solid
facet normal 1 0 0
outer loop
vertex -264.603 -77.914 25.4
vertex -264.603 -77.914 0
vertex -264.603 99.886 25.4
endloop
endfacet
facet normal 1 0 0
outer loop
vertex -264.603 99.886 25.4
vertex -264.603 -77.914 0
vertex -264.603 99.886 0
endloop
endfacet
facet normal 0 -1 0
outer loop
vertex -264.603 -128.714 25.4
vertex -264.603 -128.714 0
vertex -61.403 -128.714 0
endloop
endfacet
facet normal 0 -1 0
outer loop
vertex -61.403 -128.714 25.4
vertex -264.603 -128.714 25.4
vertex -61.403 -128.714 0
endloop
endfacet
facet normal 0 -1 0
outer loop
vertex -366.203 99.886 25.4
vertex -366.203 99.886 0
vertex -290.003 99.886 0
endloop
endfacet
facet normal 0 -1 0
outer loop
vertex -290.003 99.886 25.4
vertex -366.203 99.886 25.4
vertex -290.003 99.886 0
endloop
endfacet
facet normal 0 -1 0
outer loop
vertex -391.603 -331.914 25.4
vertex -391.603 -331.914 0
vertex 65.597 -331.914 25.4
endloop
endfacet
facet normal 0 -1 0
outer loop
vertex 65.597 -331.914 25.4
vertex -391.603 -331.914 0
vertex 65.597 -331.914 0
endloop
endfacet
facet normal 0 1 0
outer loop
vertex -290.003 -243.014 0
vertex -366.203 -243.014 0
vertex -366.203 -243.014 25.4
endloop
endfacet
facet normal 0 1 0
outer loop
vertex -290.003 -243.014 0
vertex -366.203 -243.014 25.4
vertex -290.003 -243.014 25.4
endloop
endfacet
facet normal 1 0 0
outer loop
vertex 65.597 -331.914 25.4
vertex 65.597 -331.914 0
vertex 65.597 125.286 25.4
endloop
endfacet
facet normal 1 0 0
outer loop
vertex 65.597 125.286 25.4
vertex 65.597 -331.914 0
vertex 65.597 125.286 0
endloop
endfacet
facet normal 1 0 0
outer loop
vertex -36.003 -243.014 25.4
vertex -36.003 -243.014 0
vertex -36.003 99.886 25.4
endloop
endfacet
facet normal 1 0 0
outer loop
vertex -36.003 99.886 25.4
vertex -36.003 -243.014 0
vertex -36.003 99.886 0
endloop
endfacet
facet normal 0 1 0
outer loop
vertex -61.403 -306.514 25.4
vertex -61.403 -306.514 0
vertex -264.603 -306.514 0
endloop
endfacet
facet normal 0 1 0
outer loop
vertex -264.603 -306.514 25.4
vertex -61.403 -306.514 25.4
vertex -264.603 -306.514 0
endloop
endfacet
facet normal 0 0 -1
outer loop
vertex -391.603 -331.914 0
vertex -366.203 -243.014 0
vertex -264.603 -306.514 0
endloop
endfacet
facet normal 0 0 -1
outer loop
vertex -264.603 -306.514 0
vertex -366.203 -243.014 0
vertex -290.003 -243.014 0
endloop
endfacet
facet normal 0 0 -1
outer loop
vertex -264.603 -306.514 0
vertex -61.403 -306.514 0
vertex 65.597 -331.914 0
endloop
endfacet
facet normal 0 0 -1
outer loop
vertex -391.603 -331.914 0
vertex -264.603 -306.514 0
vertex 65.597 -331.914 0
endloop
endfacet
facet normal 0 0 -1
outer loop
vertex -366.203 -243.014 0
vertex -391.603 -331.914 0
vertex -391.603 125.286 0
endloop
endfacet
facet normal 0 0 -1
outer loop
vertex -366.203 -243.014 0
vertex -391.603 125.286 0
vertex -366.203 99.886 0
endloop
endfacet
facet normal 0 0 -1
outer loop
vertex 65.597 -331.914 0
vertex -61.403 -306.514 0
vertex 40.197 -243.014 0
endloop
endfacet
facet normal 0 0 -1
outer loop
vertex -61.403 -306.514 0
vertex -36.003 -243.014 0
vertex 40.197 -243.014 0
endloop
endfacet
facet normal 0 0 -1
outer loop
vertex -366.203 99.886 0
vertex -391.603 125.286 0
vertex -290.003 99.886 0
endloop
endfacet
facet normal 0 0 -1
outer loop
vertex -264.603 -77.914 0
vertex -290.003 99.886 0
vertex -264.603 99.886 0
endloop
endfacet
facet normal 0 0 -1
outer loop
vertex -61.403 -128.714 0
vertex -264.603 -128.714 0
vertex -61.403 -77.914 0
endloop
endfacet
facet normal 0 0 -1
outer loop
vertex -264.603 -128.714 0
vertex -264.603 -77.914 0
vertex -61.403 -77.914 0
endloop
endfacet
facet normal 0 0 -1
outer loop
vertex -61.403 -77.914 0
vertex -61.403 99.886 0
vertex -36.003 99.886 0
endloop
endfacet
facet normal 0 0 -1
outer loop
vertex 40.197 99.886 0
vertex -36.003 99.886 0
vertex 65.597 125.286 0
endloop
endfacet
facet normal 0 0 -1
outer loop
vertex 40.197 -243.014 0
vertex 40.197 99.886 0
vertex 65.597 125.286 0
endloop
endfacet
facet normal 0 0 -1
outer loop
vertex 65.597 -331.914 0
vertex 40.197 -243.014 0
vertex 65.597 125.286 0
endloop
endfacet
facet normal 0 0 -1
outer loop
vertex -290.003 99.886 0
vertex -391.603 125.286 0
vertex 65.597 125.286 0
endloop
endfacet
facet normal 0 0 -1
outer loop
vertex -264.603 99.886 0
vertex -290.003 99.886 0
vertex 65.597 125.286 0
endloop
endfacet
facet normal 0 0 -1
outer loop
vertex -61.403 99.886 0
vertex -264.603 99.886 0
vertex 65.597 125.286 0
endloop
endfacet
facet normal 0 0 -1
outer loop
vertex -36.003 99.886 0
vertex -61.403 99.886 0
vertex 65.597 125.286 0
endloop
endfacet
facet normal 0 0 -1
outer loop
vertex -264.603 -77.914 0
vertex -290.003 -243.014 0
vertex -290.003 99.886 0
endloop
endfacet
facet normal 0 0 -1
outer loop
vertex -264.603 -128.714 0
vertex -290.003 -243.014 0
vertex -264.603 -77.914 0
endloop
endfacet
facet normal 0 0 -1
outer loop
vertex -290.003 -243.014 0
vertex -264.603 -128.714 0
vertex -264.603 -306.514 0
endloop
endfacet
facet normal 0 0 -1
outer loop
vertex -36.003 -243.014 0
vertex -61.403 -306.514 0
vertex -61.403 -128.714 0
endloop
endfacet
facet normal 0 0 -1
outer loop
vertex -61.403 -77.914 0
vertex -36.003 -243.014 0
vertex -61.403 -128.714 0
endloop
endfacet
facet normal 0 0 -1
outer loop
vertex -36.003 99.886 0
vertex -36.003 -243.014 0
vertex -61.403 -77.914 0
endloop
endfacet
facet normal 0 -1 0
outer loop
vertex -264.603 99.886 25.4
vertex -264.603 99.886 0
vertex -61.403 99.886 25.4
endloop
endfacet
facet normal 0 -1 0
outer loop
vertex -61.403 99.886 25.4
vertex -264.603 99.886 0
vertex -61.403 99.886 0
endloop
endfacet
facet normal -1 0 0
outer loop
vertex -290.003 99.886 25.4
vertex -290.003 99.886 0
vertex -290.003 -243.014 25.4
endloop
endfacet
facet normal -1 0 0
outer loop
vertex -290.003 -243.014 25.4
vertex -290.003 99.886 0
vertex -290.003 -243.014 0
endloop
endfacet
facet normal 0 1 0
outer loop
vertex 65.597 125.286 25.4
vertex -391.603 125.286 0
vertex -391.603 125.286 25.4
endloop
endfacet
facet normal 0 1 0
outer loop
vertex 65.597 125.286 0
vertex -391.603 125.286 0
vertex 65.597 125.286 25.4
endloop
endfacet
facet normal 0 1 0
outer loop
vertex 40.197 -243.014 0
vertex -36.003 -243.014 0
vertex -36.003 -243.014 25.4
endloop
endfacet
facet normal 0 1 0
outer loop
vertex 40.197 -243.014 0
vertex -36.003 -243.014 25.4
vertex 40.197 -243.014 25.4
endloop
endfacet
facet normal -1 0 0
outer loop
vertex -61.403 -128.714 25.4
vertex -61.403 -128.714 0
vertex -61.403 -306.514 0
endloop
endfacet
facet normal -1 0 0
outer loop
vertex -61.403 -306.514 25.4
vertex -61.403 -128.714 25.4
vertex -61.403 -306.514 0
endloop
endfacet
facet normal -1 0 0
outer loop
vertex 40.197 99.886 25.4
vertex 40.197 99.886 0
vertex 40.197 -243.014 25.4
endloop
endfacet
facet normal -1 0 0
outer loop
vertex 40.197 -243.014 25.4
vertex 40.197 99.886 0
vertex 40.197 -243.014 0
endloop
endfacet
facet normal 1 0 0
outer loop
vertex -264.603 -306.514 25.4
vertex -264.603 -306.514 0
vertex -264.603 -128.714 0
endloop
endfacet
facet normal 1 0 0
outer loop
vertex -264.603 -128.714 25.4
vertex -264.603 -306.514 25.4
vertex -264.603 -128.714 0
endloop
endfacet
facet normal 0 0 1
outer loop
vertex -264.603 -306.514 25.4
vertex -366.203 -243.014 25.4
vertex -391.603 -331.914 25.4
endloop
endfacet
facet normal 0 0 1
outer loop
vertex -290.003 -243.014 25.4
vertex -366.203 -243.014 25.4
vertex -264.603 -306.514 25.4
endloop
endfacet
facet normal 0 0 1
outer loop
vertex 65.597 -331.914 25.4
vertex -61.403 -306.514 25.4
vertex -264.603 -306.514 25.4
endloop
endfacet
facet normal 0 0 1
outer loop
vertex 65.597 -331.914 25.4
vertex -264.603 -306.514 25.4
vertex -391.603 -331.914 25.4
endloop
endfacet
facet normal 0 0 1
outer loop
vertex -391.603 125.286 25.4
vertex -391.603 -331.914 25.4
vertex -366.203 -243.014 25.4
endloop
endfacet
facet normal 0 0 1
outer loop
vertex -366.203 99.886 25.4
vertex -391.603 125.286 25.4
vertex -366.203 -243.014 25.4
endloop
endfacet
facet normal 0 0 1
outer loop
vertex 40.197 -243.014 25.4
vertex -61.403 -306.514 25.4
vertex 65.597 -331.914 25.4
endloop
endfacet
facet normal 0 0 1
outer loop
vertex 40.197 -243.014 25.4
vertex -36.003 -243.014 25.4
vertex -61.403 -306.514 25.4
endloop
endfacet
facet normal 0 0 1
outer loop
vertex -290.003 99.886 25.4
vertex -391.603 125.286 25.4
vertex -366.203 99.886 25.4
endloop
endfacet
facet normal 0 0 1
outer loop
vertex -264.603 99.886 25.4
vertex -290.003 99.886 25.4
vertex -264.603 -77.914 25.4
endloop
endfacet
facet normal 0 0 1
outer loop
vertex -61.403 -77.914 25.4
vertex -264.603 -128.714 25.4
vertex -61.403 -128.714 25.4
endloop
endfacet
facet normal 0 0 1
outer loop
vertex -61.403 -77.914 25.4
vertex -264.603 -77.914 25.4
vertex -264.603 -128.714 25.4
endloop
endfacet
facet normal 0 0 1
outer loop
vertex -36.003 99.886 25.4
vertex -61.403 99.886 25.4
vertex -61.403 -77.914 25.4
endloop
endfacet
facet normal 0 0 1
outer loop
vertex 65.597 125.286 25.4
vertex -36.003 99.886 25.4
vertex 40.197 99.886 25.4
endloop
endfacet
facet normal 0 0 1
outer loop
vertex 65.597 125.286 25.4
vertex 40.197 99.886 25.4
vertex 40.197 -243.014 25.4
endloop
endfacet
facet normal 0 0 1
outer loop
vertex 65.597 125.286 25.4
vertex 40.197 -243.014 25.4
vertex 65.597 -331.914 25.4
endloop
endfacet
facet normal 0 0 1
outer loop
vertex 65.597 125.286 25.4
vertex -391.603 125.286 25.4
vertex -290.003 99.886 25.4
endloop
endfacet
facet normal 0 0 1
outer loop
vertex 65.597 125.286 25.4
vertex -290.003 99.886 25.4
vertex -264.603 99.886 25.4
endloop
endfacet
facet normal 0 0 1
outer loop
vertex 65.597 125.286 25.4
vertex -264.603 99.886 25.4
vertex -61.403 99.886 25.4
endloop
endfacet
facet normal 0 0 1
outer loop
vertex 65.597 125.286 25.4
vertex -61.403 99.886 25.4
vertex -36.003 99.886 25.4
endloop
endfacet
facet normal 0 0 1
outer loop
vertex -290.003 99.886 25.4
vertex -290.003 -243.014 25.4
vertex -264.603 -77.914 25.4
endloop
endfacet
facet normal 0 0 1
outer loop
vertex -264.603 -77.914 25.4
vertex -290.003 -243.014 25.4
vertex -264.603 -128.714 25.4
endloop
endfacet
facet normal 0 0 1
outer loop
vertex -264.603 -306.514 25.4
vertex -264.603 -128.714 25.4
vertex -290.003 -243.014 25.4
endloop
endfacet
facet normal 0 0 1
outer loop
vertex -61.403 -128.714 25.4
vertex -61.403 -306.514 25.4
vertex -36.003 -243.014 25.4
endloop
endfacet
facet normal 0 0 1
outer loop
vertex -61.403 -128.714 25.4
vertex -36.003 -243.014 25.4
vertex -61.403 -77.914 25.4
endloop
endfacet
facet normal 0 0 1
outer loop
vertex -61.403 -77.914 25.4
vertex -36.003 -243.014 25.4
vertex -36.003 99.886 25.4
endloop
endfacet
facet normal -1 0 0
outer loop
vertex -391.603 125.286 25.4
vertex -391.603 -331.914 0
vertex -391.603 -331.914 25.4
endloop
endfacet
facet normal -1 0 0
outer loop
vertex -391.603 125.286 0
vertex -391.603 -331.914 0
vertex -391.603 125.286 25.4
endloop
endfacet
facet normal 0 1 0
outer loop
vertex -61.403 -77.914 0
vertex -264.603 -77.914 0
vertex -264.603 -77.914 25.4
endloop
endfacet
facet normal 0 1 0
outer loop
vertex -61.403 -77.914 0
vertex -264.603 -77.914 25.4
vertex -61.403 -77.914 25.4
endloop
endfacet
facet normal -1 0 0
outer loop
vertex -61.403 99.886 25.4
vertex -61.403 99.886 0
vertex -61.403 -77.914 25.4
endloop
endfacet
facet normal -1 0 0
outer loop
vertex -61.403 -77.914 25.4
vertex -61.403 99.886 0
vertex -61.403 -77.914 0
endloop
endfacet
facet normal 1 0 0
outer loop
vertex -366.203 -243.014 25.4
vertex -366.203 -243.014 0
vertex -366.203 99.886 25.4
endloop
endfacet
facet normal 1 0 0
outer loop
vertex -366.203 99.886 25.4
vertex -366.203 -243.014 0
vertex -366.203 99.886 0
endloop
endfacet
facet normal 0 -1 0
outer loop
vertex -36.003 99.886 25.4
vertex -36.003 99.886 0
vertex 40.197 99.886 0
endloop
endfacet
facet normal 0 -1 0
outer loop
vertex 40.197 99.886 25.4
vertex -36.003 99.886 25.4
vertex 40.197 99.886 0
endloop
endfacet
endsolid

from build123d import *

# Parameters (mm, degrees)
F0_W     = 457.2
F0_H     = 457.2
F1_DEPTH = 25.4
F0_W_2   = 203.2
F0_H_2   = 25.4
F2_DEPTH = 25.4
F0_W_3   = 76.2
F0_H_3   = 63.5
F3_DEPTH = 25.4


with BuildPart() as f1:
    # F0 (on Top) → F1 (new body)
    with BuildSketch(Plane.XY):
        with Locations((-163.00304, -103.314487)):
            Rectangle(F0_W, F0_H)
        Polygon((-290.00304, 99.885513), (-264.60304, 99.885513), (-61.40304, 99.885513), (-36.00304, 99.885513), (40.19696, 99.885513), (40.19696, -103.314487), (40.19696, -243.014487), (40.19696, -306.514487), (-36.00304, -306.514487), (-61.40304, -306.514487), (-264.60304, -306.514487), (-290.00304, -306.514487), (-366.20304, -306.514487), (-366.20304, -243.014487), (-366.20304, -103.314487), (-366.20304, 99.885513), align=None, mode=Mode.SUBTRACT)
    extrude(amount=F1_DEPTH)

    # F0 (on Top) → F2 (join)
    with BuildSketch(Plane.XY):
        Polygon((-264.60304, -77.914487), (-264.60304, 99.885513), (-290.00304, 99.885513), (-290.00304, -103.314487), (-290.00304, -243.014487), (-290.00304, -306.514487), (-264.60304, -306.514487), (-264.60304, -128.714487), (-264.60304, -103.314487), align=None)
        Polygon((-36.00304, 99.885513), (-61.40304, 99.885513), (-61.40304, -77.914487), (-61.40304, -103.314487), (-61.40304, -128.714487), (-61.40304, -306.514487), (-36.00304, -306.514487), (-36.00304, -243.014487), (-36.00304, -103.314487), align=None)
        with Locations((-163.00304, -116.014487)):
            Rectangle(F0_W_2, F0_H_2)
        with Locations((-163.00304, -90.614487)):
            Rectangle(F0_W_2, F0_H_2)
    extrude(amount=F2_DEPTH)

    # F0 (on Top) → F3 (join)
    with BuildSketch(Plane.XY):
        with Locations((-328.10304, -274.764487)):
            Rectangle(F0_W_3, F0_H_3)
        with Locations((2.09696, -274.764487)):
            Rectangle(F0_W_3, F0_H_3)
    extrude(amount=F3_DEPTH)


solid = f1.part
